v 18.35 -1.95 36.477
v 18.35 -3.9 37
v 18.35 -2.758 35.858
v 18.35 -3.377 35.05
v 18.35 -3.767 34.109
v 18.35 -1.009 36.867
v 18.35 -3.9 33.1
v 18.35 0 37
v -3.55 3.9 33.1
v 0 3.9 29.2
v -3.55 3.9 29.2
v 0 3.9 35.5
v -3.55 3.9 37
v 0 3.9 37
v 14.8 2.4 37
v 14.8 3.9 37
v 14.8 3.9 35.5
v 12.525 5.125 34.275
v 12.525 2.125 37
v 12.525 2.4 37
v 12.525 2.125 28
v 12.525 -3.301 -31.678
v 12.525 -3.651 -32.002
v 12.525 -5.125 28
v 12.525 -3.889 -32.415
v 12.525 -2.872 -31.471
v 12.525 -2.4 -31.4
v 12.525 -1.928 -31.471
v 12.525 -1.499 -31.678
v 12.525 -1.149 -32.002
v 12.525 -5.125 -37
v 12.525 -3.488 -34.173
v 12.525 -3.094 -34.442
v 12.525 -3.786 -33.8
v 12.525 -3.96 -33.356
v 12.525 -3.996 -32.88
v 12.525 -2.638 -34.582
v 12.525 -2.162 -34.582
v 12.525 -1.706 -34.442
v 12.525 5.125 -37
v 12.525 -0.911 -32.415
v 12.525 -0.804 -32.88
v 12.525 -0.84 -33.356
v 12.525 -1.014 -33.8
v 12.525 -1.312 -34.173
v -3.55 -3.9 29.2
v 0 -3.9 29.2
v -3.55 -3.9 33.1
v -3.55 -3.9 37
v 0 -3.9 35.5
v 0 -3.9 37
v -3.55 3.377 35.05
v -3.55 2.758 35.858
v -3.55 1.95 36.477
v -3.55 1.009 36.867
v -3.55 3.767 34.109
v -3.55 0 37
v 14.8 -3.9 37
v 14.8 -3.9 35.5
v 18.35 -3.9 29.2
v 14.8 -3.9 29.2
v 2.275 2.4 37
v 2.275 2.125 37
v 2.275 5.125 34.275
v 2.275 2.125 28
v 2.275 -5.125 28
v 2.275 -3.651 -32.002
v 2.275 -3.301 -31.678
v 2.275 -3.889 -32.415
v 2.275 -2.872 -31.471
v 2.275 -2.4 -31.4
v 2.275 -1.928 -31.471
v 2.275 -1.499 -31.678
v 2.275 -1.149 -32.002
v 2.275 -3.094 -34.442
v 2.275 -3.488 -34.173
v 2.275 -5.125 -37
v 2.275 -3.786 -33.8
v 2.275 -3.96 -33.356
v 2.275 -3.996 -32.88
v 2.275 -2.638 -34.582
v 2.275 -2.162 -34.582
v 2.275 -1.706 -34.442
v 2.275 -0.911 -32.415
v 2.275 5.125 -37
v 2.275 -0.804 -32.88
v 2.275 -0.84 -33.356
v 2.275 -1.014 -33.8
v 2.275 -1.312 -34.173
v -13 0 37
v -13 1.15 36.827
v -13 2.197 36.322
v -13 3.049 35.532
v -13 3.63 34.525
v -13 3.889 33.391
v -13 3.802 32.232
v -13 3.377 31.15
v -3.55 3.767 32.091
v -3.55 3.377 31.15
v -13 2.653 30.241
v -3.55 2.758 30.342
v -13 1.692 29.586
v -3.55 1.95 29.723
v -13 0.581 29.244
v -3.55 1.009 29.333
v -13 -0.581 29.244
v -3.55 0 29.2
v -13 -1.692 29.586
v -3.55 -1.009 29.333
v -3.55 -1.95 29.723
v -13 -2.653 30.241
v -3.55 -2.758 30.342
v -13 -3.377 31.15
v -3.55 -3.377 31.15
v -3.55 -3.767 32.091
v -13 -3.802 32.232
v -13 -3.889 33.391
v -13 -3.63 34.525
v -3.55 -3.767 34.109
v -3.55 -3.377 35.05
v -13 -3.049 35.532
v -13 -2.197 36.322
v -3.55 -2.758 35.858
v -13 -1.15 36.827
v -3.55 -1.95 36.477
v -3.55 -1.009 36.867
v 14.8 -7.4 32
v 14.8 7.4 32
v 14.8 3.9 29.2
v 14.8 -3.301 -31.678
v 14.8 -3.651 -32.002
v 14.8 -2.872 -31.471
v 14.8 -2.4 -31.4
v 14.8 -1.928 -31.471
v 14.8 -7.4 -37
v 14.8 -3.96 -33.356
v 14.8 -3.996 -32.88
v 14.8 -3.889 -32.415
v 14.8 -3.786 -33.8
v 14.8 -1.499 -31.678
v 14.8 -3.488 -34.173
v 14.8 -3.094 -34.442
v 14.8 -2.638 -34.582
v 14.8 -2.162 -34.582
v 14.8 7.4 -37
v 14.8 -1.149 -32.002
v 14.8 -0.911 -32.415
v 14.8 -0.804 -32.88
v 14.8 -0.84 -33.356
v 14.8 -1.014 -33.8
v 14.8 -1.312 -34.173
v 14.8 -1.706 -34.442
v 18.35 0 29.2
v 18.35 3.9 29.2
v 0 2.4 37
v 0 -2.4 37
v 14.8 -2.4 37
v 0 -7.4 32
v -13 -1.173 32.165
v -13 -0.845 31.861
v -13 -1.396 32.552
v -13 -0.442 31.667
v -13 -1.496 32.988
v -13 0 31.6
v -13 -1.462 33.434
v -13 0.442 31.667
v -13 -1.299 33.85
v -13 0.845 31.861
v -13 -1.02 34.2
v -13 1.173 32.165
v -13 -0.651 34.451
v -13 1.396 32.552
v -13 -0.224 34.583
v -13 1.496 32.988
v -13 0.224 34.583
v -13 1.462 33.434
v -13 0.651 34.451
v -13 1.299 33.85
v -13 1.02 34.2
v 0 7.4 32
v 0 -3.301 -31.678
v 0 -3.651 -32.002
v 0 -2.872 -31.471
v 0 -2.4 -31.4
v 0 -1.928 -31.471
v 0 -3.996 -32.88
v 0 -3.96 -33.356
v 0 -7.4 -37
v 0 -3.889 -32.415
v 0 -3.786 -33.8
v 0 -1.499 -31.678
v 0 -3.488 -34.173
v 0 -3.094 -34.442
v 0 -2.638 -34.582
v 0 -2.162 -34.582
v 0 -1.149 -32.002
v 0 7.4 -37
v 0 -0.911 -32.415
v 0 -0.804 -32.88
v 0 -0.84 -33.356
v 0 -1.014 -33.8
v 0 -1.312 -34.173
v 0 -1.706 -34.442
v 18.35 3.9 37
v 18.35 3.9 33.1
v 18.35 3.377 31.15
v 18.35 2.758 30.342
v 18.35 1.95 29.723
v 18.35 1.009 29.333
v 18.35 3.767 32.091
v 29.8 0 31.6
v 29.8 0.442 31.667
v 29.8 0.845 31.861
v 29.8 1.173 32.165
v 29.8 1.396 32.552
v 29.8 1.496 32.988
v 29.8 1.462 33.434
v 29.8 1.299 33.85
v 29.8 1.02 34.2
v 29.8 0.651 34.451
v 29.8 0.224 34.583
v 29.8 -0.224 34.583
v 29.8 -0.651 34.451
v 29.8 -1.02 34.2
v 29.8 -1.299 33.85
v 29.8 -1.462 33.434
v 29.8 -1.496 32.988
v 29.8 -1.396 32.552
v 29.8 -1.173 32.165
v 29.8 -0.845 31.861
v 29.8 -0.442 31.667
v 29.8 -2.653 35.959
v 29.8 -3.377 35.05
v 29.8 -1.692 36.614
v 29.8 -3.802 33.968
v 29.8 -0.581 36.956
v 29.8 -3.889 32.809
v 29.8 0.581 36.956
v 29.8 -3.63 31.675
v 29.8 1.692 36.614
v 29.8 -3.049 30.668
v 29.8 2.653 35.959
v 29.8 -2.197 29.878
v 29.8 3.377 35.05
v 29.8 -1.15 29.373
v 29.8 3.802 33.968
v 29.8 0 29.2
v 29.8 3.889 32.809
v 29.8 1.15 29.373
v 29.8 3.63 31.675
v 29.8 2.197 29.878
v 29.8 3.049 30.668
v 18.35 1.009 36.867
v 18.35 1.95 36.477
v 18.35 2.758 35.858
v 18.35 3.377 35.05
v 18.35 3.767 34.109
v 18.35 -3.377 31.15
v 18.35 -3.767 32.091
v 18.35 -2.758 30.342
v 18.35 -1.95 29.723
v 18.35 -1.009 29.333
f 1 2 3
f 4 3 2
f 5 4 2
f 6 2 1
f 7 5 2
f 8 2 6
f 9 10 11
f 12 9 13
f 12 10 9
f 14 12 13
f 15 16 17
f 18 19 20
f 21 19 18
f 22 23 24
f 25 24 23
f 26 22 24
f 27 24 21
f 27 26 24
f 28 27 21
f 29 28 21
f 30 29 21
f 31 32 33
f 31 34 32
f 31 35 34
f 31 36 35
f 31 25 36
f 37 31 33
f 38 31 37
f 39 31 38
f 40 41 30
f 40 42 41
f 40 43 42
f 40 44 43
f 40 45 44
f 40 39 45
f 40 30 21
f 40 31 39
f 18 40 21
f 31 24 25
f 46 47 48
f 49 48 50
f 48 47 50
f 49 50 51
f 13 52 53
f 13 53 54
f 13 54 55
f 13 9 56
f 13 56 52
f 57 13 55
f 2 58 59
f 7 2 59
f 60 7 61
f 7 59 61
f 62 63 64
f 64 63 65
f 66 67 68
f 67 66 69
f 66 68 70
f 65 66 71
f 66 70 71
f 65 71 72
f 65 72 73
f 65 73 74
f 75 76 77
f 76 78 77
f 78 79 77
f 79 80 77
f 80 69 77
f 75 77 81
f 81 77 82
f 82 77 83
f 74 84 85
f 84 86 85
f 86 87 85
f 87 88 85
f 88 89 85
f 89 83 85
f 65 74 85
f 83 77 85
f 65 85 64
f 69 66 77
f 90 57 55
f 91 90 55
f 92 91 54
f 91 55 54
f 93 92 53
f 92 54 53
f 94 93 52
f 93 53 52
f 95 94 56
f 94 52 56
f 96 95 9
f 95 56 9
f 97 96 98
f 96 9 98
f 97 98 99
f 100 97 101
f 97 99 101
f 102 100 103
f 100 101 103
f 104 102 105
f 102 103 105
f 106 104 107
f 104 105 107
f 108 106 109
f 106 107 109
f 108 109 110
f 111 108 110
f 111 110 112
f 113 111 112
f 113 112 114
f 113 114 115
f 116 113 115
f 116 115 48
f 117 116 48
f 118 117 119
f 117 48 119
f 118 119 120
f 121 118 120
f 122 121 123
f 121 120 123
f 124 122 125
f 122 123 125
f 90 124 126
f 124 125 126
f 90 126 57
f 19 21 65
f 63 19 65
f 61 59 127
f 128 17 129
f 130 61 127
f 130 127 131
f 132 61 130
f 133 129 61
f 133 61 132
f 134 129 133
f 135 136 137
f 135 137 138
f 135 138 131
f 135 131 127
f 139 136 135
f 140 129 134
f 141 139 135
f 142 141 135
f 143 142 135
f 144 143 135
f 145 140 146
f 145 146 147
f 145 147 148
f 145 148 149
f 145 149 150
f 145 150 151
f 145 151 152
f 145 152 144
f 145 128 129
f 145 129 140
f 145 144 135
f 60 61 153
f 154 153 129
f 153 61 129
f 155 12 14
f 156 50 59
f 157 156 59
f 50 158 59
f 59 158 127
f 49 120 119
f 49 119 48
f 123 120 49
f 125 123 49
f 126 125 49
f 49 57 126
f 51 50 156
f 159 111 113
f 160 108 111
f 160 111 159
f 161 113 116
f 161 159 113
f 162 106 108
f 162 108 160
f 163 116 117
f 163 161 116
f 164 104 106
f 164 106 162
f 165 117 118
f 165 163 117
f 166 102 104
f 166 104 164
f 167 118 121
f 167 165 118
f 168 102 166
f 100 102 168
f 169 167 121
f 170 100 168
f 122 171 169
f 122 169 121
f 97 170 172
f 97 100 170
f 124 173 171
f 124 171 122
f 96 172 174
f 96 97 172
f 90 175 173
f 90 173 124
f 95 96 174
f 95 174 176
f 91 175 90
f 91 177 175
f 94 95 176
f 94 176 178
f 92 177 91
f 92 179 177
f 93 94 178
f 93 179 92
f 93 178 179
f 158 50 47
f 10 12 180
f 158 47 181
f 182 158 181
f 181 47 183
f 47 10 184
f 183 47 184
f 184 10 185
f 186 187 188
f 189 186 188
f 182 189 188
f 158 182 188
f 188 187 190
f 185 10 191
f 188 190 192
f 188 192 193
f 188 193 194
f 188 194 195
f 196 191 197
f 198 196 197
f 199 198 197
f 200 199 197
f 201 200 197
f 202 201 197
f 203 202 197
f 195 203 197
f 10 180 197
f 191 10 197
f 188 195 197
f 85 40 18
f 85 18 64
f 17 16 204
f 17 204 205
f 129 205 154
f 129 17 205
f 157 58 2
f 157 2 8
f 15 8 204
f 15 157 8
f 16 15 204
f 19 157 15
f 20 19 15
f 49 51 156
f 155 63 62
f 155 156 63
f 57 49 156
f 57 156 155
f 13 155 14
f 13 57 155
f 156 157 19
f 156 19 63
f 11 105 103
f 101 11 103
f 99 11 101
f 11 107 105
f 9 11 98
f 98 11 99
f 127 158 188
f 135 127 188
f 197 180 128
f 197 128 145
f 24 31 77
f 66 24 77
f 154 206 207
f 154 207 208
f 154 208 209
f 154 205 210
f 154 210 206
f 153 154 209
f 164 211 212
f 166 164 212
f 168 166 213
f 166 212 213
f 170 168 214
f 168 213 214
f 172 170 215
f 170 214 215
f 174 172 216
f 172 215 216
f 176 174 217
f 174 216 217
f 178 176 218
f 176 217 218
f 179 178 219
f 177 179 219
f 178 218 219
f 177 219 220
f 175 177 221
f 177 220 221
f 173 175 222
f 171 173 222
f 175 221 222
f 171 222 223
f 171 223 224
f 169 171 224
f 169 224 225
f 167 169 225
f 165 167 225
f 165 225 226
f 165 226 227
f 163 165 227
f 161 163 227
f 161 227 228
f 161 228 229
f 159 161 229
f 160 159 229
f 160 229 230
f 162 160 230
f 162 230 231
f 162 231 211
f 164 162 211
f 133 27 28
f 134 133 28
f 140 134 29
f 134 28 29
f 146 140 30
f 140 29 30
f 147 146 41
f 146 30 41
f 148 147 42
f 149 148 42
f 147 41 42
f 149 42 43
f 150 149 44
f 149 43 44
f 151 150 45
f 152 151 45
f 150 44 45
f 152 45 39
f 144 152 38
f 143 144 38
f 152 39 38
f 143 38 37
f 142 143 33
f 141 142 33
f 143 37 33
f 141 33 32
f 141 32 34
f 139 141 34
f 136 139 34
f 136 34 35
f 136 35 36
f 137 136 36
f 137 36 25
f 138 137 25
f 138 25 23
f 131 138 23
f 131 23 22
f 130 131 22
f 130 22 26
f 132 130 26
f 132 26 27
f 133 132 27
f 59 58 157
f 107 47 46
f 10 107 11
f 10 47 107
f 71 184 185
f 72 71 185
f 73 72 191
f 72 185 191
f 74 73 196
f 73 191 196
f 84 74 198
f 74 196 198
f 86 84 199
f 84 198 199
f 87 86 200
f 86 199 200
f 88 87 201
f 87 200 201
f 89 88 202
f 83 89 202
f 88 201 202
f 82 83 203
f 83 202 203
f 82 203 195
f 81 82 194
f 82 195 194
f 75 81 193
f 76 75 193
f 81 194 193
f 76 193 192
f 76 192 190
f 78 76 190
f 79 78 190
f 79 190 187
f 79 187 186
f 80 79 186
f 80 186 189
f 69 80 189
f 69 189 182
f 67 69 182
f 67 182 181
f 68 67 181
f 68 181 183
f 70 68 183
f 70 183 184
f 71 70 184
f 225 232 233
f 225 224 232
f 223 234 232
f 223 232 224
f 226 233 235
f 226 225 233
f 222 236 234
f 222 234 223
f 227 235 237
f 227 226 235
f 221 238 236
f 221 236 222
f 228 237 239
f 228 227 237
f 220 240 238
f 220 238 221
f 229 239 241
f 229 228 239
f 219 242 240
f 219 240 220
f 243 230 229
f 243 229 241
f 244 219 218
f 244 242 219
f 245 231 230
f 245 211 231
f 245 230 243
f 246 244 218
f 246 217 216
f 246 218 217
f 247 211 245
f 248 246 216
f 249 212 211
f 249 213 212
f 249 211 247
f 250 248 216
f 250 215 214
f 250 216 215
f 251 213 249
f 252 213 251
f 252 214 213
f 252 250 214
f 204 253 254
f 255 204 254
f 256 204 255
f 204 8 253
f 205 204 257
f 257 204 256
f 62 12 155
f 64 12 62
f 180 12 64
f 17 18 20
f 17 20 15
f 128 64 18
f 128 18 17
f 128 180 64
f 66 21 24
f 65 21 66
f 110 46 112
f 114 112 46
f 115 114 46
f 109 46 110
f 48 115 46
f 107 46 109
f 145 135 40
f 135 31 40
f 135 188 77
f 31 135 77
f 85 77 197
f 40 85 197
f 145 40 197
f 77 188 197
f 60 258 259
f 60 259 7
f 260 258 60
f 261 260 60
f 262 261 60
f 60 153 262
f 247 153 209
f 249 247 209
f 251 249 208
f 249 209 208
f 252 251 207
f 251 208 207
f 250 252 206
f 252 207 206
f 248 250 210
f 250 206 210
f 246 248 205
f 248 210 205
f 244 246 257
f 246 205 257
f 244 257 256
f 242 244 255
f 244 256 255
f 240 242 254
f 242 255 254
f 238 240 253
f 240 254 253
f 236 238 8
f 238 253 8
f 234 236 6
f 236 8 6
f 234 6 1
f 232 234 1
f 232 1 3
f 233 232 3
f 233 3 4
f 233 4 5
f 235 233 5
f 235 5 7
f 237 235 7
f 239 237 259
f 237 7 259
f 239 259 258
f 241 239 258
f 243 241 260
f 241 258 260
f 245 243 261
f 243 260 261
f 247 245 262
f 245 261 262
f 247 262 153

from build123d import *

# Parameters (mm, degrees)
SKETCH_1_W          = 74
SKETCH_1_H          = 14.8
EXTRUDE_1_DEPTH     = 14.8
SKETCH_2_W          = 10.25
SKETCH_2_H          = 10.25
CUT_EXTRUDE_1_DEPTH = 65
SKETCH_3_R          = 3.9
EXTRUDE_2_DEPTH     = 15
SKETCH_4_R          = 3.9
EXTRUDE_3_DEPTH     = 13
CHAMFER_1_SIZE      = 5
SKETCH_8_R          = 1.45
CUT_EXTRUDE_4_DEPTH = 43.8
SKETCH_9_W          = 7.8
SKETCH_9_H          = 7.8
SKETCH_9_R          = 1.5
EXTRUDE_4_DEPTH     = 3.55
SKETCH_10_W         = 7.8
SKETCH_10_H         = 7.8
EXTRUDE_5_DEPTH     = 3.55
SKETCH1_R           = 1.6
CUT_EXTRUDE1_DEPTH  = 30.8
SKETCH2_R           = 1.5
CUT_EXTRUDE2_DEPTH  = 43.8
SKETCH3_W           = 10.25
SKETCH3_H           = 3
CUT_EXTRUDE3_DEPTH  = 10


with BuildPart() as part:
    # Эскиз1 → Бобышка-Вытянуть1 (new body)
    with BuildSketch(Plane(origin=(0, 0, 0), x_dir=(0, 0, -1), z_dir=(1, 0, 0))):
        Rectangle(SKETCH_1_W, SKETCH_1_H)
    extrude(amount=EXTRUDE_1_DEPTH)

    # Эскиз2 → Вырез-Вытянуть1 (cut)
    with BuildSketch(Plane(origin=(0, 0, -37), x_dir=(-1, 0, 0), z_dir=(0, 0, -1))):
        with Locations((-7.4, 0)):
            Rectangle(SKETCH_2_W, SKETCH_2_H)
    extrude(amount=-CUT_EXTRUDE_1_DEPTH, mode=Mode.SUBTRACT)

    # Эскиз3 → Бобышка-Вытянуть2 (add)
    with BuildSketch(Plane(origin=(14.8, 0, 0), x_dir=(0, 0, -1), z_dir=(1, 0, 0))):
        with Locations((-33.1, 0)):
            Circle(SKETCH_3_R)
    extrude(amount=EXTRUDE_2_DEPTH)

    # Эскиз4 → Бобышка-Вытянуть3 (add)
    with BuildSketch(Plane.ZY):
        with Locations((33.1, 0)):
            Circle(SKETCH_4_R)
    extrude(amount=EXTRUDE_3_DEPTH)

    # Фаска1
    chamfer_1_edges = [part.edges().sort_by_distance(p)[0] for p in [
        (7.4, 7.4, 37),
        (7.4, -7.4, 37),
    ]]
    chamfer(chamfer_1_edges, length=CHAMFER_1_SIZE)

    # Эскиз8 → Вырез-Вытянуть4 (cut, through all)
    with BuildSketch(Plane(origin=(29.8, 0, 0), x_dir=(0, 0, -1), z_dir=(1, 0, 0))):
        with Locations((-33.1, 0)):
            Circle(SKETCH_8_R)
    extrude(amount=-CUT_EXTRUDE_4_DEPTH, mode=Mode.SUBTRACT)

    # Эскиз9 → Бобышка-Вытянуть4 (add)
    with BuildSketch(Plane.ZY):
        with Locations((33.1, 0)):
            Rectangle(SKETCH_9_W, SKETCH_9_H)
        with Locations((33.1, 0)):
            Circle(SKETCH_9_R, mode=Mode.SUBTRACT)
    extrude(amount=EXTRUDE_4_DEPTH)

    # Эскиз10 → Бобышка-Вытянуть5 (add)
    with BuildSketch(Plane(origin=(14.8, 0, 0), x_dir=(0, 0, -1), z_dir=(1, 0, 0))):
        with Locations((-33.1, 0)):
            Rectangle(SKETCH_10_W, SKETCH_10_H)
    extrude(amount=EXTRUDE_5_DEPTH)

    # Sketch1 → Cut-Extrude1 (cut, through all)
    with BuildSketch(Plane.ZY):
        with Locations((-33, -2.4)):
            Circle(SKETCH1_R)
    extrude(amount=-CUT_EXTRUDE1_DEPTH, mode=Mode.SUBTRACT)

    # Sketch2 → Cut-Extrude2 (cut, through all)
    with BuildSketch(Plane(origin=(29.8, 0, 0), x_dir=(0, 0, -1), z_dir=(1, 0, 0))):
        with Locations((-33.1, 0)):
            Circle(SKETCH2_R)
    extrude(amount=-CUT_EXTRUDE2_DEPTH, mode=Mode.SUBTRACT)

    # Sketch3 → Cut-Extrude3 (cut, through all)
    with BuildSketch(Plane(origin=(0, 0, 28), x_dir=(-1, 0, 0), z_dir=(0, 0, -1))):
        with Locations((-7.4, 3.625)):
            Rectangle(SKETCH3_W, SKETCH3_H)
    extrude(amount=-CUT_EXTRUDE3_DEPTH, mode=Mode.SUBTRACT)


solid = part.part
